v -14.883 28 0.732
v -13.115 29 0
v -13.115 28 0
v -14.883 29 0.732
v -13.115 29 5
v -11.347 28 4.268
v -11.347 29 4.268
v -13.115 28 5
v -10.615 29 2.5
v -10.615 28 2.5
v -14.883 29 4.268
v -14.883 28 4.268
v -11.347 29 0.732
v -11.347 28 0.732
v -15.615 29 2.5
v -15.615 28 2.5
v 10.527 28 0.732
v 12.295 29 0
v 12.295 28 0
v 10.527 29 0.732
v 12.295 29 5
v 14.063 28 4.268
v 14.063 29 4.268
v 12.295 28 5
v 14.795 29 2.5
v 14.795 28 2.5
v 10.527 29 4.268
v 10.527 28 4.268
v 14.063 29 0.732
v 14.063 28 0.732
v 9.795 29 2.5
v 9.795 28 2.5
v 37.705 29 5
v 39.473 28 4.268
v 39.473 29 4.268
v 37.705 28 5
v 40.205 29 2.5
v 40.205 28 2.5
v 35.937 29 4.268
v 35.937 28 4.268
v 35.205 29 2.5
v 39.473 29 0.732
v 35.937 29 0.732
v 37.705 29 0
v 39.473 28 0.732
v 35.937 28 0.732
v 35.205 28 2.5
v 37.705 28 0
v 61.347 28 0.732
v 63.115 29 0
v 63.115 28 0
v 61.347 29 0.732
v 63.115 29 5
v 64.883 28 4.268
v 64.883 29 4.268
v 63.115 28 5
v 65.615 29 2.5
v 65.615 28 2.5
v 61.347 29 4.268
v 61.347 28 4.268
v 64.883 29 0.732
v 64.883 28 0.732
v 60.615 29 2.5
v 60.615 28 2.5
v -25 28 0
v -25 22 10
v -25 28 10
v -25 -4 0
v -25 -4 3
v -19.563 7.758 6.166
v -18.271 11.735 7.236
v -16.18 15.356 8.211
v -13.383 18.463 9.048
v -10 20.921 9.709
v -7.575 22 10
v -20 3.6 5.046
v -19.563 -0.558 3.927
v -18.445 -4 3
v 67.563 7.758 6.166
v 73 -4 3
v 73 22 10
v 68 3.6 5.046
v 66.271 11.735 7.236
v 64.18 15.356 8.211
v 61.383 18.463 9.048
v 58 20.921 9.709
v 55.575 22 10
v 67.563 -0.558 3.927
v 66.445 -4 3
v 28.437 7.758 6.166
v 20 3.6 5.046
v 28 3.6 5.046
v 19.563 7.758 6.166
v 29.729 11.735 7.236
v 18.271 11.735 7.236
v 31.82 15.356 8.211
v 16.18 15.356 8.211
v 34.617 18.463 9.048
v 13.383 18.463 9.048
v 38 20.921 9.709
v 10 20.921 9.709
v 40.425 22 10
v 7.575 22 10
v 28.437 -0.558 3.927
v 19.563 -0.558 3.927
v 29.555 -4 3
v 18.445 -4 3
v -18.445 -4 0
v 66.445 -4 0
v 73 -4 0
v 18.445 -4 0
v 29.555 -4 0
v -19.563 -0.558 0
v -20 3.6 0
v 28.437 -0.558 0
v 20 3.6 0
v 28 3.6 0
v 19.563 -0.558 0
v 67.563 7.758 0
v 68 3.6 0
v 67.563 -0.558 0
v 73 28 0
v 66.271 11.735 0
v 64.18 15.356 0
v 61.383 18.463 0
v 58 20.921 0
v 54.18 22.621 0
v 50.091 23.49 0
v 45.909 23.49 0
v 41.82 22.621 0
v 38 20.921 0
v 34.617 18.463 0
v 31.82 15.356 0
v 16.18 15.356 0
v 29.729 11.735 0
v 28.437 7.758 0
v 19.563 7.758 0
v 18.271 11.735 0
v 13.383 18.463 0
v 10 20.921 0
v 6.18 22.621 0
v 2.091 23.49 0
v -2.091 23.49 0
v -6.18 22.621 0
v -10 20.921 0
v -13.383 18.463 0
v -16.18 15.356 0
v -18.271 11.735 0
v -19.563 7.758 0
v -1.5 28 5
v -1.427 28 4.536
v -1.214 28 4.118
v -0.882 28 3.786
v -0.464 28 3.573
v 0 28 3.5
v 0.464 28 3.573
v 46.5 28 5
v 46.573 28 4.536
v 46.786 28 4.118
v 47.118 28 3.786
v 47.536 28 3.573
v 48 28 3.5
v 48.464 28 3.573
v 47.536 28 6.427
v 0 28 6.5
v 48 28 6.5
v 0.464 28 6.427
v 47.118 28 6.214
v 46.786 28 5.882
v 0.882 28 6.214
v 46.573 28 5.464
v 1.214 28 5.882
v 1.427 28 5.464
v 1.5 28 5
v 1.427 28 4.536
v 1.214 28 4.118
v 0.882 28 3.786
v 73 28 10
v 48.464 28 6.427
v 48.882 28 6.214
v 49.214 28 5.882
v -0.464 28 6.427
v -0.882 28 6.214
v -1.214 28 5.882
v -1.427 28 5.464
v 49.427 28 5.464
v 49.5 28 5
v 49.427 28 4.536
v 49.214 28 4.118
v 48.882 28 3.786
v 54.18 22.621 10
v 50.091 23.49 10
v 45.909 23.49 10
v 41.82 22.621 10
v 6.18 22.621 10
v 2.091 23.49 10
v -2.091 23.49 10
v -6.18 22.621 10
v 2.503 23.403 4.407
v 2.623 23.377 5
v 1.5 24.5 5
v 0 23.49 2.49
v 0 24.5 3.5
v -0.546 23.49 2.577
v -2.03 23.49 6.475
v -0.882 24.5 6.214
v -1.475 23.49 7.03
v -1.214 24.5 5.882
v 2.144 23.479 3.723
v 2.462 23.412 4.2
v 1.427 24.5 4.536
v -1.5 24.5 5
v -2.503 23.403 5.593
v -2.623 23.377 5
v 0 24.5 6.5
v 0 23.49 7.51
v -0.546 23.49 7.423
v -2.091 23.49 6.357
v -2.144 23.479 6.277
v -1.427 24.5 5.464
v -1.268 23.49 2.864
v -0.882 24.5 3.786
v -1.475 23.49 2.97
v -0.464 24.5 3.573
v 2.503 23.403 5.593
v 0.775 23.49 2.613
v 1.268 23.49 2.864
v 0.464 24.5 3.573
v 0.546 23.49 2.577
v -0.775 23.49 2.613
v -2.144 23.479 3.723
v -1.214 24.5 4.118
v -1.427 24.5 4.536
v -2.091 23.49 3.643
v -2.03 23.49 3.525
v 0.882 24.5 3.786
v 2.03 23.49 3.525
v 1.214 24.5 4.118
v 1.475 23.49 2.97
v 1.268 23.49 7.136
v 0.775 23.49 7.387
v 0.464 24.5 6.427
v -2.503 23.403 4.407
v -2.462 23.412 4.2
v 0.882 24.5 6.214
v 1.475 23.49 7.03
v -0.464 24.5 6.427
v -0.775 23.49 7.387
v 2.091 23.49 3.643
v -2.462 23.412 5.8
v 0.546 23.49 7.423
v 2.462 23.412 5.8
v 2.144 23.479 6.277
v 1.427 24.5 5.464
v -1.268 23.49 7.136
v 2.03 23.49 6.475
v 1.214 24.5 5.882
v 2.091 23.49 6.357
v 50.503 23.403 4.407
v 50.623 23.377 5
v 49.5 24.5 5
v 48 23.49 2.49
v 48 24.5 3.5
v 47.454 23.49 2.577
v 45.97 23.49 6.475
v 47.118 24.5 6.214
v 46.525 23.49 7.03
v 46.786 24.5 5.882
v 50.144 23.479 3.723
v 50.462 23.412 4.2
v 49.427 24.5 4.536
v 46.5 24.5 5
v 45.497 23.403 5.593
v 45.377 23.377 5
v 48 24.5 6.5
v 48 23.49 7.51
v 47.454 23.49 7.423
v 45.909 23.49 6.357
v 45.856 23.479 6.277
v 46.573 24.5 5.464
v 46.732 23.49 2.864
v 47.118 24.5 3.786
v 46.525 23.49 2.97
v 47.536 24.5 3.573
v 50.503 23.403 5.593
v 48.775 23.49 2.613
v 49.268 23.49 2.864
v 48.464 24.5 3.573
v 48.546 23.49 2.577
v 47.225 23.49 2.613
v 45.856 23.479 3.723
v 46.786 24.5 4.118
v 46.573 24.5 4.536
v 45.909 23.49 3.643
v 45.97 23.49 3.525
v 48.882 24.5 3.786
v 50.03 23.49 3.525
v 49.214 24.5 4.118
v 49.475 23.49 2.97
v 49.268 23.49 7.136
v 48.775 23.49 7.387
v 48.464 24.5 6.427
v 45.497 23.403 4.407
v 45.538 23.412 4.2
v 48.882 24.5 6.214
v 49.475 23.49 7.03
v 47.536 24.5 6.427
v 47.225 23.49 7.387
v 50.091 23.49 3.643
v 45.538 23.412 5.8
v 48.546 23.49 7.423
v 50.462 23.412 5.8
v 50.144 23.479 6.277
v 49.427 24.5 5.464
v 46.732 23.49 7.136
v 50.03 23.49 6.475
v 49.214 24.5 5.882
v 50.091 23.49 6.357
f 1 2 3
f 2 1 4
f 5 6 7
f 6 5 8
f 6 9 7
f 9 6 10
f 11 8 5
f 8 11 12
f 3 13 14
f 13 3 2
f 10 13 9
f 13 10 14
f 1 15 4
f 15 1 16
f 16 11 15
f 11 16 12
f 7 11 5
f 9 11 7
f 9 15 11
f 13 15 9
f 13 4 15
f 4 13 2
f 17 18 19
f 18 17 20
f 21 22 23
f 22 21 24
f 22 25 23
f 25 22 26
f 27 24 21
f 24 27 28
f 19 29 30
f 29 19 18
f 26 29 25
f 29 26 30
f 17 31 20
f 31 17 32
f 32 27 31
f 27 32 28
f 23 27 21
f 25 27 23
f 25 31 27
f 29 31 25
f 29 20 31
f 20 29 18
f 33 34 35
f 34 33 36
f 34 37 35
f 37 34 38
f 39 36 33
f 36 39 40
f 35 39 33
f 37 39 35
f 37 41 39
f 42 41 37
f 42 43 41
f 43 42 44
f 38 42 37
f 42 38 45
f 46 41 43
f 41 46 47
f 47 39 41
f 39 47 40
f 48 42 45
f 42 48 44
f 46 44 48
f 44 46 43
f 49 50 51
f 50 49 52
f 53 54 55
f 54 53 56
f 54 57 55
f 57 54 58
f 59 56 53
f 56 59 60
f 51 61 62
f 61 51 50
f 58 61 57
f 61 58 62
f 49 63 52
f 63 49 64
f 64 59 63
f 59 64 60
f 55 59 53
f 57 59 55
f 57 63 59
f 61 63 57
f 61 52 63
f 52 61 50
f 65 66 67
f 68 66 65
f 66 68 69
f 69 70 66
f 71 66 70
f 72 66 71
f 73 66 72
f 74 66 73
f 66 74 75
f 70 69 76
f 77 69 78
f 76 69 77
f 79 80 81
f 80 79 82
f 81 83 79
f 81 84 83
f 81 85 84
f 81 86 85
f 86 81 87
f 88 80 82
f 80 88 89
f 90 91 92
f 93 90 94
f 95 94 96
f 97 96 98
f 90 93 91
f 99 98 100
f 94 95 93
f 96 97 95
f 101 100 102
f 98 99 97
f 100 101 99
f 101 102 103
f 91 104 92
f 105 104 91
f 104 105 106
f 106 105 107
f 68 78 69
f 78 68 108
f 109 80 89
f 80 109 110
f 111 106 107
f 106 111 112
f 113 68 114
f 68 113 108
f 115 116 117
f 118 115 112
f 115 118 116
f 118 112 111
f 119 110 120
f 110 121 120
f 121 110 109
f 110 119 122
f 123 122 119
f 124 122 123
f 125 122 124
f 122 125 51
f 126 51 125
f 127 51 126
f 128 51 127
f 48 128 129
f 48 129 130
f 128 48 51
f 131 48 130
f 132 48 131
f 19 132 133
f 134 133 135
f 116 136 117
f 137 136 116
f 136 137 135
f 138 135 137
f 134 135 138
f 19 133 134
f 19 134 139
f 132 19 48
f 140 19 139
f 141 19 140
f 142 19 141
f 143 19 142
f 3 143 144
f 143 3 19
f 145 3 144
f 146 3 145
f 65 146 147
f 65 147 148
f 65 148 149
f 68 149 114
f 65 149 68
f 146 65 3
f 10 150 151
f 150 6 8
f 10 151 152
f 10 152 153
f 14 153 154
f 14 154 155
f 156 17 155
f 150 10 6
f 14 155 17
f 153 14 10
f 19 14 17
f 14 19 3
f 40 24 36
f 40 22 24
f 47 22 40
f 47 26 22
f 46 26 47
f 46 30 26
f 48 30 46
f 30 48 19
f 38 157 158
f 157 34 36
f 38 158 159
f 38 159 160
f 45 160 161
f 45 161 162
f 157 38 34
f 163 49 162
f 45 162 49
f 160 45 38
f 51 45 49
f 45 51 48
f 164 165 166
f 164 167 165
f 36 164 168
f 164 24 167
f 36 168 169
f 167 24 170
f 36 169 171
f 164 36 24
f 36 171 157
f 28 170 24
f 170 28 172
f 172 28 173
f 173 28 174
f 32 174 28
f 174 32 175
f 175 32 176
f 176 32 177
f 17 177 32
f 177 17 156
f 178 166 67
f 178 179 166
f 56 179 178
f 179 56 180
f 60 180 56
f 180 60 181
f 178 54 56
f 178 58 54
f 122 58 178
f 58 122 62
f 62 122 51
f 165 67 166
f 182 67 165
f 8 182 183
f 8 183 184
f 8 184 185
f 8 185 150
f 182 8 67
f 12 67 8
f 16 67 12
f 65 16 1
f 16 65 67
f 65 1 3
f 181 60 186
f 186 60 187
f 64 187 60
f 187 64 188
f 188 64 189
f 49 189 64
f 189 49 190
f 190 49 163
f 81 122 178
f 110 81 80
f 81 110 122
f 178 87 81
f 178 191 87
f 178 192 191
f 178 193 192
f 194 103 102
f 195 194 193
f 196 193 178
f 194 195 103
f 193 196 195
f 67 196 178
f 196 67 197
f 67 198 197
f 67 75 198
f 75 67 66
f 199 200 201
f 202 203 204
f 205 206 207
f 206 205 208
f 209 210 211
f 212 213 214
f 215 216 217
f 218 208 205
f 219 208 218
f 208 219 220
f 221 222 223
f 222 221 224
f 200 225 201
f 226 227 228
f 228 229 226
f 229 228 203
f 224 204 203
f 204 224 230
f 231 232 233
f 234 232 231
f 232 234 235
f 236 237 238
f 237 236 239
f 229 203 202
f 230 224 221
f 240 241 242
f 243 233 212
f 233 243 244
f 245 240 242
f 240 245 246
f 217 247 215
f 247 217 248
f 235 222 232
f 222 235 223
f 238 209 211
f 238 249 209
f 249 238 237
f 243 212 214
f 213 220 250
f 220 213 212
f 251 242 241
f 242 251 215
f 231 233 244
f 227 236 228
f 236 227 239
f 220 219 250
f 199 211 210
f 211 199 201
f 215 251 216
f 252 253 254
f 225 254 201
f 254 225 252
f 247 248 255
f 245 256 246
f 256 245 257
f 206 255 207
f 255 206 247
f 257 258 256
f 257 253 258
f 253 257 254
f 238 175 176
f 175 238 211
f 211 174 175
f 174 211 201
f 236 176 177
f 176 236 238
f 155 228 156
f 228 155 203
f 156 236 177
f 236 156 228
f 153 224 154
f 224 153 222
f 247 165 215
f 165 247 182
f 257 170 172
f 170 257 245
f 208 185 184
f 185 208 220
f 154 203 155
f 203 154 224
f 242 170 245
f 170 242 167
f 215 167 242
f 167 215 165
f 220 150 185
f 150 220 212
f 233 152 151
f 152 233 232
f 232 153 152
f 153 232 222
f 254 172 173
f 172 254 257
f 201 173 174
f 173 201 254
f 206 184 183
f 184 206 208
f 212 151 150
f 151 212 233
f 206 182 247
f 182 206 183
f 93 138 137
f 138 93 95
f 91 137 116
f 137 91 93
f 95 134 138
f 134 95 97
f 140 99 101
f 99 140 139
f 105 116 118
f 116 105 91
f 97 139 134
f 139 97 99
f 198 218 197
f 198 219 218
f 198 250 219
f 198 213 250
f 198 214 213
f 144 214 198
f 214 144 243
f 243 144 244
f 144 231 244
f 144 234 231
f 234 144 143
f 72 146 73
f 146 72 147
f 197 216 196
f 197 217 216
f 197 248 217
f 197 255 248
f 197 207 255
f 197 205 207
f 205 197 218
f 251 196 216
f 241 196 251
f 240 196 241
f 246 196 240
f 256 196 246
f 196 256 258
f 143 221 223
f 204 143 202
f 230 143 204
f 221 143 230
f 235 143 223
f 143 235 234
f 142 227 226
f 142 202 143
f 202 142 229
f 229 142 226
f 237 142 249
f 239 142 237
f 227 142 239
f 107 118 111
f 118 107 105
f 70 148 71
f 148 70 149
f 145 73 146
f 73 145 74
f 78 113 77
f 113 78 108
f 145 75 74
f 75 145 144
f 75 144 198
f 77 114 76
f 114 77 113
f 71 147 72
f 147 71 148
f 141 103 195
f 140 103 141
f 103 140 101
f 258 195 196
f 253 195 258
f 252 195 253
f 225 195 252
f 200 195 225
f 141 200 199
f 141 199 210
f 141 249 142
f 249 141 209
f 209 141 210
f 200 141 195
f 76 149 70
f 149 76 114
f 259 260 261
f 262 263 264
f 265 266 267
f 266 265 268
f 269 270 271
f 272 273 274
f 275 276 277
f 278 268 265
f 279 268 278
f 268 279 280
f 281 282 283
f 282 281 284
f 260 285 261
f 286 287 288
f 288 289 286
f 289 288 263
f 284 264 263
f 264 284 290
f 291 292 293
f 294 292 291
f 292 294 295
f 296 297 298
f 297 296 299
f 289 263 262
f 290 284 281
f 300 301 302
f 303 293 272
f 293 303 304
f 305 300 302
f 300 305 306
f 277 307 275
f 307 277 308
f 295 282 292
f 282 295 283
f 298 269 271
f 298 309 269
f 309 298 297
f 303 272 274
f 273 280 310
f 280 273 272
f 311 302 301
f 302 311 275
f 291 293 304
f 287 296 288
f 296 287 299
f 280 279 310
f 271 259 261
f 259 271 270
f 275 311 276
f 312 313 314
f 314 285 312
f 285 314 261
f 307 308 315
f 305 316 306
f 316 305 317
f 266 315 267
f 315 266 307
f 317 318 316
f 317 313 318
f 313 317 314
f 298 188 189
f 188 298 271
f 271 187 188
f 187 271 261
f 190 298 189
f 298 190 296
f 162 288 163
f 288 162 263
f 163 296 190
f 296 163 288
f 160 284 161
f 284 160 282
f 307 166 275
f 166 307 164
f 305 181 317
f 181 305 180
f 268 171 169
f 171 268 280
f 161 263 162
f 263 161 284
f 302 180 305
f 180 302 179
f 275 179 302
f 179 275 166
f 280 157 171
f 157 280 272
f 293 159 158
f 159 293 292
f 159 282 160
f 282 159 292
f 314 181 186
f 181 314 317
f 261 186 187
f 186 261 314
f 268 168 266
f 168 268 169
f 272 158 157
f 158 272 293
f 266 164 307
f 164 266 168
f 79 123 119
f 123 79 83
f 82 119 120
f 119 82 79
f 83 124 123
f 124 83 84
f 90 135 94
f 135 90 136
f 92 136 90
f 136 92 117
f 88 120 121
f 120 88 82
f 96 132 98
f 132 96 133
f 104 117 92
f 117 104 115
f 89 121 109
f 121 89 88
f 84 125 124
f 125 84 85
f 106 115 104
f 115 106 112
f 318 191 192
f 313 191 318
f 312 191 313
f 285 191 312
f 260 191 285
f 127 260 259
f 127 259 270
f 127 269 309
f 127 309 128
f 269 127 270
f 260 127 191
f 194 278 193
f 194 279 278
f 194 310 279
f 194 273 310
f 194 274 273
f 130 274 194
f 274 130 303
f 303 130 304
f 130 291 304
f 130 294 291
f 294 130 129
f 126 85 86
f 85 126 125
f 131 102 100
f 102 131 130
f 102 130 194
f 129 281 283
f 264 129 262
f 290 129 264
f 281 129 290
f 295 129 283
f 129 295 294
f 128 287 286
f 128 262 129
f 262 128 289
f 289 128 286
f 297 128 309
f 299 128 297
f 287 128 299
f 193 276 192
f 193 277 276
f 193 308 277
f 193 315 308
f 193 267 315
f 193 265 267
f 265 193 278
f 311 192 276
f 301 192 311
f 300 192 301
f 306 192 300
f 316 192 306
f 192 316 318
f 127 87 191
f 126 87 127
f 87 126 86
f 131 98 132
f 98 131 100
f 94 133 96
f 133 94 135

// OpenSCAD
//!OpenSCAD

// Diameter of container
JarDiameter = 40; // [20:60]

// Pitch of 48 for 40 mm jar
// Pitch of 39 for 30 mm jar
// 48 for 40 mm jar or 39 for 30 mm jar works well
Pitch = 48; // [30:80]

// Total number of jars
Number_Jars = 2; // [1:40]

//Height of flange that attaches to pegboard
FlangeHeight = 10; // [10:30]

// Do you want pegs? 
WantPegs =  "yes"; // [yes,no]

// Look at the model after rendering. You may want to add or subtract a peg
TweakPegs = 0; // [-1,0,+1]

module MakeHolder() {
  // The depth as a function of the jar diameter
  DepthCarrier = JarDiameter / 2 + 2;
  // Calculate the number of peg holes that the carrier stradles
  NumberPegs = floor((Number_Jars * Pitch) / 25.41) + TweakPegs;
  // Calculate the difference in length between the carrier and the number of pegs so we can centre the peg holes on the back
  DifferenceInLength = (Number_Jars * Pitch + 2) - NumberPegs * 25.41;
  // The carrier with Number Holes in it
  difference() {
    union(){
      // The carrier to which we will add the pegs and subtract the holes
      color([0.93,0,0]) {
        hull(){
          // The carrier is the slanted piece with a horizontal ledge this is the high back 10 mm high
          translate([(-1 - Pitch / 2), DepthCarrier, 0]){
            cube([(Number_Jars * Pitch + 2), 6, FlangeHeight], center=false);
          }
          // And this is the front piece just 3mm high
          translate([(-1 - Pitch / 2), -4, 0]){
            cube([(Number_Jars * Pitch + 2), 1, 3], center=false);
          }
        }
      }
      // The pegs for the pegboard to keep it aligned
      if (WantPegs == "yes") {
        rotate([90, 0, 0]){
          for (j = [0 : abs(1) : NumberPegs]) {
            translate([(j * 25.41 - (Pitch / 2 - DifferenceInLength / 2)), 2.5, ((0 - DepthCarrier) - 7)]){
              cylinder(r1=2.5, r2=2.5, h=5, center=false);
            }
          }

        }
      }

    }

    // The holes subtracted
    for (i = [0 : abs(1) : Number_Jars - 1]) {
      union(){
        // The hole for container
        translate([(i * Pitch), (JarDiameter * 0.09), 0]){
          cylinder(r1=(JarDiameter / 2), r2=(JarDiameter / 2), h=FlangeHeight, center=false);
        }
        // The screw holes for fastening to pegboard
        translate([(i * Pitch), (DepthCarrier + 0.5), (FlangeHeight / 2)]){
          color([1,0.8,0]) {
            rotate([270, 0, 0]){
              {
                $fn=20;    //set sides to 20
                // #6 wood screw with countersink head
                union(){
                  cylinder(r1=3.5, r2=1.5, h=2, center=false);
                  cylinder(r1=1.5, r2=1.5, h=10, center=false);
                }
              }
            }
          }
        }
      }
    }

  }
}

MakeHolder();
